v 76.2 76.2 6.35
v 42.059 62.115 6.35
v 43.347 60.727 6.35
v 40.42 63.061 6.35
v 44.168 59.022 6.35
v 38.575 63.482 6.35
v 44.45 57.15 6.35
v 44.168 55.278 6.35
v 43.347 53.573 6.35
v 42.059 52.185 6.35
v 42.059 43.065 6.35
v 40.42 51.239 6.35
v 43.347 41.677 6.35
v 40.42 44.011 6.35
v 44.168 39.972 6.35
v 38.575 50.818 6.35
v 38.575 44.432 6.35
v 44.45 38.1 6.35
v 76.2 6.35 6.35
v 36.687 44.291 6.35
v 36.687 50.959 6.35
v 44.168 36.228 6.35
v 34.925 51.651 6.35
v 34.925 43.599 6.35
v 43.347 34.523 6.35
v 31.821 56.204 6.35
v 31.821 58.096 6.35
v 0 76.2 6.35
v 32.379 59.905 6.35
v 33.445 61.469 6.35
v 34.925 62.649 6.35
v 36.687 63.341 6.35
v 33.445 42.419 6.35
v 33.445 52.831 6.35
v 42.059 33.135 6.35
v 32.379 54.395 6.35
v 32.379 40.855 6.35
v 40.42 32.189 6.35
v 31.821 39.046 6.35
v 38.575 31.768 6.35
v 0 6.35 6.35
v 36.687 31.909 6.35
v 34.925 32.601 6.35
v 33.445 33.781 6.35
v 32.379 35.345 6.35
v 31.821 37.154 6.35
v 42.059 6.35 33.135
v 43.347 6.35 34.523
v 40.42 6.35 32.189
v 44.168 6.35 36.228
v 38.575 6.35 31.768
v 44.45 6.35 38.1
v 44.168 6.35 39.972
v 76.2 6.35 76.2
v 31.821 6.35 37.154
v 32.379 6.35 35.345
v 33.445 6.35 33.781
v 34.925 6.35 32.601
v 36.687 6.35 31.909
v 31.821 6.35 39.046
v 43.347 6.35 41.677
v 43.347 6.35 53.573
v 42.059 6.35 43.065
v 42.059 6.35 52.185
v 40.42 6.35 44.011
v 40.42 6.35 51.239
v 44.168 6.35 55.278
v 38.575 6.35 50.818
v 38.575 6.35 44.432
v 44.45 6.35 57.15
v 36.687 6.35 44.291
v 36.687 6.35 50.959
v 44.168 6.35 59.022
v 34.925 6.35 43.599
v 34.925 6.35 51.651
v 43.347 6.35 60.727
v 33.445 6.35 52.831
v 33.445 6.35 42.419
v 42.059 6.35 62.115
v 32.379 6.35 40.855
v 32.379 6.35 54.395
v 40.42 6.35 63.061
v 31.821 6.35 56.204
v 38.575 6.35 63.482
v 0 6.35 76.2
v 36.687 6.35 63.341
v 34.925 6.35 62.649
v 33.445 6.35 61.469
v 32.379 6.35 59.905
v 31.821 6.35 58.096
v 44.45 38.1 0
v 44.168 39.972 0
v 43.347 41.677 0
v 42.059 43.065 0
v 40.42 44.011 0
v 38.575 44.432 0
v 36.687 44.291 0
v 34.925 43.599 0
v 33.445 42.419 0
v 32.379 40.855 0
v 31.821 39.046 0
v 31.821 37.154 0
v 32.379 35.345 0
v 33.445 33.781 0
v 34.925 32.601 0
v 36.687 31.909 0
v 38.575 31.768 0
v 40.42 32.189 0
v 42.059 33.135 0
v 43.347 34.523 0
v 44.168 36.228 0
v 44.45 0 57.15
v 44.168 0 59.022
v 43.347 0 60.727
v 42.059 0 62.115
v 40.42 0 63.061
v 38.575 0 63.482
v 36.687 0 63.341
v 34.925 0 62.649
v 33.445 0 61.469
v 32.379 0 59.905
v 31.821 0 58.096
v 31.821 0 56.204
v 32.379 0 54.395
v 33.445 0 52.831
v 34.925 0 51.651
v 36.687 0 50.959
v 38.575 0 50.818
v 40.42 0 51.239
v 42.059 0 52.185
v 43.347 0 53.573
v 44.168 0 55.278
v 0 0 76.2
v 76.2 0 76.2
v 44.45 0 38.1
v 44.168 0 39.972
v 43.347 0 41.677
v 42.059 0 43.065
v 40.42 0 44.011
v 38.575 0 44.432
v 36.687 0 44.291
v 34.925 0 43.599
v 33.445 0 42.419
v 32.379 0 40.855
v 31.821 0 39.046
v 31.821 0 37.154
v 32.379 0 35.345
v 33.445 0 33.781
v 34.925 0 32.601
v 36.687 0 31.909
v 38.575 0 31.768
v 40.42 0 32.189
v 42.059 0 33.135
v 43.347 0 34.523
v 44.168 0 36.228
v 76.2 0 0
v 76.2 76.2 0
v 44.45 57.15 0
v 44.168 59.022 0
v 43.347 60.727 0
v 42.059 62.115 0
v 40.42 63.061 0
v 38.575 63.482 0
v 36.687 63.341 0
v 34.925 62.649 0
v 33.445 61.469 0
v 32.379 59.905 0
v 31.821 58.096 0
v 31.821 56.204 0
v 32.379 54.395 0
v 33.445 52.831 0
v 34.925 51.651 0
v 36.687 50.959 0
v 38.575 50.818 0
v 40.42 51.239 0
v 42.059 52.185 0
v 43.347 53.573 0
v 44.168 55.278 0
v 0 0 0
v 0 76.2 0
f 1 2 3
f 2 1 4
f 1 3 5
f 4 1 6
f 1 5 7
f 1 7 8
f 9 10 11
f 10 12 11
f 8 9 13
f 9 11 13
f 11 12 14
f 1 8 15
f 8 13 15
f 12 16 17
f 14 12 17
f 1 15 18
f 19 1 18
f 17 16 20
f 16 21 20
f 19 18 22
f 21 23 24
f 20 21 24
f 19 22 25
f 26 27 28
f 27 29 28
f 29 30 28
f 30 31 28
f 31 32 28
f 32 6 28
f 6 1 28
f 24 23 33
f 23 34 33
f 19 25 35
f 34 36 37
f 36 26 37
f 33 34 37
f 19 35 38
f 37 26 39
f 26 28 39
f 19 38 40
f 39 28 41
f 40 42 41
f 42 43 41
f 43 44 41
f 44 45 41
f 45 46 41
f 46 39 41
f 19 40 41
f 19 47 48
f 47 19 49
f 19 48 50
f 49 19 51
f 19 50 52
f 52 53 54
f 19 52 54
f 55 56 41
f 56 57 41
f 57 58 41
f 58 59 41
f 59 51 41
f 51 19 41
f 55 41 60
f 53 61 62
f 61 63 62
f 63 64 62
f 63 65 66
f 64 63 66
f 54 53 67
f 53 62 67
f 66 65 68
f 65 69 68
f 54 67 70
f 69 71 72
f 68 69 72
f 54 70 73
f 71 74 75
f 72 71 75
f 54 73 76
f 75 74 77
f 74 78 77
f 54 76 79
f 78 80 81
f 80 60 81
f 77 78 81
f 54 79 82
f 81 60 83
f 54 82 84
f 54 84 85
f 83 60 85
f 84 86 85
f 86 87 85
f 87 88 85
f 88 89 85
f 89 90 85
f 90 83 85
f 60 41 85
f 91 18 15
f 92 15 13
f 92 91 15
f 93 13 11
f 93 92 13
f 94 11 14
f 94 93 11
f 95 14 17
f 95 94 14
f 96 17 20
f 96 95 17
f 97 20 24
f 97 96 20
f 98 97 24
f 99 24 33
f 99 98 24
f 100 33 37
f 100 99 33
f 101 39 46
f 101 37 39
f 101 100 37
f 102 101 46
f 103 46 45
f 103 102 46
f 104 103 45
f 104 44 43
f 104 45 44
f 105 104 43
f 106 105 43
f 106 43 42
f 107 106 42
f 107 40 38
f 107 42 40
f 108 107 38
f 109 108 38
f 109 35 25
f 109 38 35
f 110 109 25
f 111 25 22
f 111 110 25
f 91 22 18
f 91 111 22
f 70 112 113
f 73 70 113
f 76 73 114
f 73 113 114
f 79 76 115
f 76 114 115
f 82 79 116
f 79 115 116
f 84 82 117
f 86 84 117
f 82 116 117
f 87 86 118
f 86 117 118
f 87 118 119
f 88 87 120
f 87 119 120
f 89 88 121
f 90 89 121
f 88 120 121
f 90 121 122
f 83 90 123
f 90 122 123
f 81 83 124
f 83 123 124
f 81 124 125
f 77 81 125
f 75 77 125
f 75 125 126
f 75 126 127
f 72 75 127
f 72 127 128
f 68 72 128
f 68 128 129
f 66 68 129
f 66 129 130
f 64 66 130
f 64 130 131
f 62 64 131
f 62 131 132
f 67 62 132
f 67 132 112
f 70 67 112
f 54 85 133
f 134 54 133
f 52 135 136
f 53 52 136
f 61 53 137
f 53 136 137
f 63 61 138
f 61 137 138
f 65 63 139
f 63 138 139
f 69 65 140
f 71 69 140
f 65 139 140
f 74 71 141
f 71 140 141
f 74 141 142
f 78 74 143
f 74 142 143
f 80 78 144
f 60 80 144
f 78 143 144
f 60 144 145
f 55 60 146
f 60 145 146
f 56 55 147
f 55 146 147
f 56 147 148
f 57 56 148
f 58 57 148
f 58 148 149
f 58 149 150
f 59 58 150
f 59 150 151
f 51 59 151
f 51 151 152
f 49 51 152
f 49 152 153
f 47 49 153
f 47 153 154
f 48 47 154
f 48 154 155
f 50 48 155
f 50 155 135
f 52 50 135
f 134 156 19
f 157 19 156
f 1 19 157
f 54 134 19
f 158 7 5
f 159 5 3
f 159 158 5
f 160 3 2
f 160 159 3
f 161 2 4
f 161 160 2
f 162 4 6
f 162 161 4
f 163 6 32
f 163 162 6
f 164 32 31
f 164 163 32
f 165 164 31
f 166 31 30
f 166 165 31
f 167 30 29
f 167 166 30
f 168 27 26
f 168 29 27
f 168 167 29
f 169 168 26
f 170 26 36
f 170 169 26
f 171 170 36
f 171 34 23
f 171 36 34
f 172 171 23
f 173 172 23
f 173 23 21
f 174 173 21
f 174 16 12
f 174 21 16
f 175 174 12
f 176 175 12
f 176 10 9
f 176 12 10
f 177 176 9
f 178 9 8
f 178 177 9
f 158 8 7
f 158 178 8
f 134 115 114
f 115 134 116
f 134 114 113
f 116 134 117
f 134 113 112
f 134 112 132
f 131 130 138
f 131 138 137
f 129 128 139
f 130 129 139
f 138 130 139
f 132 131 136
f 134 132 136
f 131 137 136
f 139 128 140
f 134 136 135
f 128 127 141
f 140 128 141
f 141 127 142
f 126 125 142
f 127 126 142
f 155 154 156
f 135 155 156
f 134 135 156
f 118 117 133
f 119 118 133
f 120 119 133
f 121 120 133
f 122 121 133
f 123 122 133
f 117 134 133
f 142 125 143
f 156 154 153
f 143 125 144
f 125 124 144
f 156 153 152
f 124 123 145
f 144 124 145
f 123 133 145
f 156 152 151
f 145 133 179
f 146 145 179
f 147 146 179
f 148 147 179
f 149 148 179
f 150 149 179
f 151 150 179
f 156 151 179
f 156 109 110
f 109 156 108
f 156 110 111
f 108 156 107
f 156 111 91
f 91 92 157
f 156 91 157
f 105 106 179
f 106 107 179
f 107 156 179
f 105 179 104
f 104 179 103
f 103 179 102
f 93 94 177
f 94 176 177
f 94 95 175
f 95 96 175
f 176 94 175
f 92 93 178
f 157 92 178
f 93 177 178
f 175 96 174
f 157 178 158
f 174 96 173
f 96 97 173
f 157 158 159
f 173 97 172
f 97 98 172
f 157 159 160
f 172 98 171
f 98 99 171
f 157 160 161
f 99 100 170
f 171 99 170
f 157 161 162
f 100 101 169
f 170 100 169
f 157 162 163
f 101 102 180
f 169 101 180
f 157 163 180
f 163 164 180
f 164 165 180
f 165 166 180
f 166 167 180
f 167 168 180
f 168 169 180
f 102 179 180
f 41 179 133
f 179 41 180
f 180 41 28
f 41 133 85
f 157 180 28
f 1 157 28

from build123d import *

# Parameters (mm, degrees)
F1_DEPTH = 76.2
F2_R     = 6.35
F3_DEPTH = 76.201
F4_R     = 6.35
F5_DEPTH = 76.201


with BuildPart() as f1:
    # F0 (on Right) → F1 (new body)
    with BuildSketch(Plane.YZ):
        Polygon((0, 76.2), (0, 0), (76.2, 0), (76.2, 6.35), (6.35, 6.35), (6.35, 76.2), align=None)
    extrude(amount=F1_DEPTH)

    # F2 (on Front) → F3 (cut, through all)
    with BuildSketch(Plane.XZ):
        with Locations((38.1, 57.15)):
            Circle(F2_R)
        with Locations((38.1, 38.1)):
            Circle(F2_R)
    extrude(amount=-F3_DEPTH, mode=Mode.SUBTRACT)

    # F4 (on Top) → F5 (cut, through all)
    with BuildSketch(Plane.XY):
        with Locations((38.1, 38.1)):
            Circle(F4_R)
        with Locations((38.1, 57.15)):
            Circle(F4_R)
    extrude(amount=F5_DEPTH, mode=Mode.SUBTRACT)


solid = f1.part
